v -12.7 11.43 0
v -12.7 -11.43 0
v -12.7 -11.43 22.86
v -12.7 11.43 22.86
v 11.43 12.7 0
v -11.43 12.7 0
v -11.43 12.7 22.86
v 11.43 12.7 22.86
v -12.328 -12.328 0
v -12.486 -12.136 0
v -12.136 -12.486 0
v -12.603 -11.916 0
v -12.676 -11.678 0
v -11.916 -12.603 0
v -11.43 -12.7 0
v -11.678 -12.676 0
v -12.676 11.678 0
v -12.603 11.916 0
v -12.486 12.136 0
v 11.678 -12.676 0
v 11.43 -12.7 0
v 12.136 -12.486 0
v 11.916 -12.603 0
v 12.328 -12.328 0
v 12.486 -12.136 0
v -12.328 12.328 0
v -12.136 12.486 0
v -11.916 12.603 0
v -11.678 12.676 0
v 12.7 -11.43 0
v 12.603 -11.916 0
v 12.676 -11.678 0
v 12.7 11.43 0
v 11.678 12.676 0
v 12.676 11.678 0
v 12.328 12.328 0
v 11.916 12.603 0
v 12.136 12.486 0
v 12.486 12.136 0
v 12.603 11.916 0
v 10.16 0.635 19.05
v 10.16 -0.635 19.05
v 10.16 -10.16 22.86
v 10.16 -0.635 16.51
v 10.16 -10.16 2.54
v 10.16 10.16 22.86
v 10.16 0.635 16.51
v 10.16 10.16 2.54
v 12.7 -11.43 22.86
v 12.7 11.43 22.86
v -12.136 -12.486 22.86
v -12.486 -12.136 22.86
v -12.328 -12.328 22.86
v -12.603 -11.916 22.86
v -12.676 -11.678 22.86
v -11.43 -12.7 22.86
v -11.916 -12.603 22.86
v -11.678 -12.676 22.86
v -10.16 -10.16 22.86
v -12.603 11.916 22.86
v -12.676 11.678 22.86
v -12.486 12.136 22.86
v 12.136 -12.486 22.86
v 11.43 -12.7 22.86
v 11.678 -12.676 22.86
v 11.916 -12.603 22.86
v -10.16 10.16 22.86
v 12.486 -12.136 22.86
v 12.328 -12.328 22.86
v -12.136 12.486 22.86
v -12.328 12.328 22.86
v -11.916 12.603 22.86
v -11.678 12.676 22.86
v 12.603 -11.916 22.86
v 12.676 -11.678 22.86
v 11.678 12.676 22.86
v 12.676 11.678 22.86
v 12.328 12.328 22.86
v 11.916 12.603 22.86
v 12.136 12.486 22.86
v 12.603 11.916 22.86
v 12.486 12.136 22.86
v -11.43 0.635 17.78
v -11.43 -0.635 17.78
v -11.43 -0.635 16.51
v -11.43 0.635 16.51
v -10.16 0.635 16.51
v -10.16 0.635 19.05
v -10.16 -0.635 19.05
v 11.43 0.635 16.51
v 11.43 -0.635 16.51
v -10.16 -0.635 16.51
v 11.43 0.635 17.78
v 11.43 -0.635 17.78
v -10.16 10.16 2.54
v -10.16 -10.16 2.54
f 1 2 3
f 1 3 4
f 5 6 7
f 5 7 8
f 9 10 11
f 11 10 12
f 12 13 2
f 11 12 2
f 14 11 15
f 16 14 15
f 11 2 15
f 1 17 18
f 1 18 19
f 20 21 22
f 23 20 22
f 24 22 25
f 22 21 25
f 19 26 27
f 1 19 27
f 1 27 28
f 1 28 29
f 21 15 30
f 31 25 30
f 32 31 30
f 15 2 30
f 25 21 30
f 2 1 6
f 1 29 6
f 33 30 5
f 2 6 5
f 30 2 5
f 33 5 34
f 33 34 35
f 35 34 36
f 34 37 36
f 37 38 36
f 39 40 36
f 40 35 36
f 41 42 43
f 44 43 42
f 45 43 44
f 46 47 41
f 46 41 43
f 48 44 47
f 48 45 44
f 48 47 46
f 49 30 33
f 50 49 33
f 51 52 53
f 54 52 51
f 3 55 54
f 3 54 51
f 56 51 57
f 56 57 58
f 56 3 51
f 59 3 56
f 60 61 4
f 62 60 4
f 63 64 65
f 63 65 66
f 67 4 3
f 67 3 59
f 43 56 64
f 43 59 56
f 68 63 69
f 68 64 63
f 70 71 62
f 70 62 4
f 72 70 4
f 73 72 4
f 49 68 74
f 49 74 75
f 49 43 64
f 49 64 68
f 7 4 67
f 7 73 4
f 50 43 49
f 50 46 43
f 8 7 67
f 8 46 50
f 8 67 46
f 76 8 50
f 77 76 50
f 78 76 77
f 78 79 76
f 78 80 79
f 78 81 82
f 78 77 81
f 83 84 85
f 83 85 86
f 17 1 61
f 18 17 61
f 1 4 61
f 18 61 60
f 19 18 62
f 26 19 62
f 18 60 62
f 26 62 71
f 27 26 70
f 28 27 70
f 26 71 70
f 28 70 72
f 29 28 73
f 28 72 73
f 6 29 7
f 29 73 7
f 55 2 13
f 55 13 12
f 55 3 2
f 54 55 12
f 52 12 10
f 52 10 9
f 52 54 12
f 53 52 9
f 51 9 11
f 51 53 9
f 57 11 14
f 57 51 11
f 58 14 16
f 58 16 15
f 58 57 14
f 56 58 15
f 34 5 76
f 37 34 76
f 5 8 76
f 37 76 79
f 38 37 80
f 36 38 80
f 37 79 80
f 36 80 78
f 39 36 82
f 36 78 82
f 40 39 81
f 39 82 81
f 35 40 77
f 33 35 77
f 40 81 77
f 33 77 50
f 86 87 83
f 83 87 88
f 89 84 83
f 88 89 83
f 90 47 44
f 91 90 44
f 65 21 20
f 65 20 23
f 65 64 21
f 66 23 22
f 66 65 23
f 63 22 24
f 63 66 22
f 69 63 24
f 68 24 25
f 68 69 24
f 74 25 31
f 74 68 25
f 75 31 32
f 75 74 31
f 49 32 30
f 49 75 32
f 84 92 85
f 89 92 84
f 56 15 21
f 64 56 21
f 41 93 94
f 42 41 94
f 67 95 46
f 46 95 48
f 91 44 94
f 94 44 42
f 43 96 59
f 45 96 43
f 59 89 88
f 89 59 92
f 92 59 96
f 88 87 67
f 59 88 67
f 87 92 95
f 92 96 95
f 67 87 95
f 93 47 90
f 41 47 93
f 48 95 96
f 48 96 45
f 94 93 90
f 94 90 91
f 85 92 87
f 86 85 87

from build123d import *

# Parameters (mm, degrees)
F0_W     = 20.32
F0_H     = 20.32
F1_DEPTH = 2.54
F0_W_2   = 25.4
F0_H_2   = 25.4
F2_DEPTH = 22.86
F3_W     = 1.27
F3_H     = 2.54
F3_W_2   = 0.635
F3_H_2   = 1.27
F4_DEPTH = 1.27
F5_SIZE  = 1.26999
F6_W     = 1.27
F6_H     = 2.54
F7_DEPTH = 1.27
F8_SIZE  = 1.26999
F9_R     = 1.27


# Not quite as in the source:
# - a fillet or chamfer is up to 0.001 mm smaller than in the source, because OpenCascade refuses the exact size


with BuildPart() as f1:
    # F0 (on Top) → F1 (new body)
    with BuildSketch(Plane.XY):
        Rectangle(F0_W, F0_H)
    extrude(amount=F1_DEPTH)

    # F0 (on Top) → F2 (join)
    with BuildSketch(Plane.XY):
        Rectangle(F0_W_2, F0_H_2)
        Rectangle(F0_W, F0_H, mode=Mode.SUBTRACT)
    extrude(amount=F2_DEPTH)

    # F3 (on face) → F4 (cut)
    with BuildSketch(Plane.YZ.offset(-10.16)):
        with Locations((0, 17.78)):
            Rectangle(F3_W, F3_H)
        with Locations((0, 17.78)):
            Rectangle(F3_W_2, F3_H_2, mode=Mode.SUBTRACT)
        with Locations((0, 17.78)):
            Rectangle(F3_W_2, F3_H_2)
    extrude(amount=-F4_DEPTH, mode=Mode.SUBTRACT)

    # F5 (size 1.27 in the source; OpenCascade refuses exactly that, so slightly less here)
    f5_edges = [f1.edges().sort_by_distance(p)[0] for p in [
        (-11.43, 0, 19.05),
    ]]
    chamfer(f5_edges, length=F5_SIZE)

    # F6 (on face) → F7 (cut)
    with BuildSketch(Plane(origin=(10.16, 0, 0), x_dir=(0, -1, 0), z_dir=(-1, 0, 0))):
        with Locations((0, 17.78)):
            Rectangle(F6_W, F6_H)
    extrude(amount=-F7_DEPTH, mode=Mode.SUBTRACT)

    # F8 (size 1.27 in the source; OpenCascade refuses exactly that, so slightly less here)
    f8_edges = [f1.edges().sort_by_distance(p)[0] for p in [
        (11.43, 0, 19.05),
    ]]
    chamfer(f8_edges, length=F8_SIZE)

    # F9
    f9_edges = [f1.edges().sort_by_distance(p)[0] for p in [
        (-12.7, -12.7, 11.43),
        (12.7, -12.7, 11.43),
        (12.7, 12.7, 11.43),
        (-12.7, 12.7, 11.43),
    ]]
    fillet(f9_edges, radius=F9_R)


solid = f1.part
